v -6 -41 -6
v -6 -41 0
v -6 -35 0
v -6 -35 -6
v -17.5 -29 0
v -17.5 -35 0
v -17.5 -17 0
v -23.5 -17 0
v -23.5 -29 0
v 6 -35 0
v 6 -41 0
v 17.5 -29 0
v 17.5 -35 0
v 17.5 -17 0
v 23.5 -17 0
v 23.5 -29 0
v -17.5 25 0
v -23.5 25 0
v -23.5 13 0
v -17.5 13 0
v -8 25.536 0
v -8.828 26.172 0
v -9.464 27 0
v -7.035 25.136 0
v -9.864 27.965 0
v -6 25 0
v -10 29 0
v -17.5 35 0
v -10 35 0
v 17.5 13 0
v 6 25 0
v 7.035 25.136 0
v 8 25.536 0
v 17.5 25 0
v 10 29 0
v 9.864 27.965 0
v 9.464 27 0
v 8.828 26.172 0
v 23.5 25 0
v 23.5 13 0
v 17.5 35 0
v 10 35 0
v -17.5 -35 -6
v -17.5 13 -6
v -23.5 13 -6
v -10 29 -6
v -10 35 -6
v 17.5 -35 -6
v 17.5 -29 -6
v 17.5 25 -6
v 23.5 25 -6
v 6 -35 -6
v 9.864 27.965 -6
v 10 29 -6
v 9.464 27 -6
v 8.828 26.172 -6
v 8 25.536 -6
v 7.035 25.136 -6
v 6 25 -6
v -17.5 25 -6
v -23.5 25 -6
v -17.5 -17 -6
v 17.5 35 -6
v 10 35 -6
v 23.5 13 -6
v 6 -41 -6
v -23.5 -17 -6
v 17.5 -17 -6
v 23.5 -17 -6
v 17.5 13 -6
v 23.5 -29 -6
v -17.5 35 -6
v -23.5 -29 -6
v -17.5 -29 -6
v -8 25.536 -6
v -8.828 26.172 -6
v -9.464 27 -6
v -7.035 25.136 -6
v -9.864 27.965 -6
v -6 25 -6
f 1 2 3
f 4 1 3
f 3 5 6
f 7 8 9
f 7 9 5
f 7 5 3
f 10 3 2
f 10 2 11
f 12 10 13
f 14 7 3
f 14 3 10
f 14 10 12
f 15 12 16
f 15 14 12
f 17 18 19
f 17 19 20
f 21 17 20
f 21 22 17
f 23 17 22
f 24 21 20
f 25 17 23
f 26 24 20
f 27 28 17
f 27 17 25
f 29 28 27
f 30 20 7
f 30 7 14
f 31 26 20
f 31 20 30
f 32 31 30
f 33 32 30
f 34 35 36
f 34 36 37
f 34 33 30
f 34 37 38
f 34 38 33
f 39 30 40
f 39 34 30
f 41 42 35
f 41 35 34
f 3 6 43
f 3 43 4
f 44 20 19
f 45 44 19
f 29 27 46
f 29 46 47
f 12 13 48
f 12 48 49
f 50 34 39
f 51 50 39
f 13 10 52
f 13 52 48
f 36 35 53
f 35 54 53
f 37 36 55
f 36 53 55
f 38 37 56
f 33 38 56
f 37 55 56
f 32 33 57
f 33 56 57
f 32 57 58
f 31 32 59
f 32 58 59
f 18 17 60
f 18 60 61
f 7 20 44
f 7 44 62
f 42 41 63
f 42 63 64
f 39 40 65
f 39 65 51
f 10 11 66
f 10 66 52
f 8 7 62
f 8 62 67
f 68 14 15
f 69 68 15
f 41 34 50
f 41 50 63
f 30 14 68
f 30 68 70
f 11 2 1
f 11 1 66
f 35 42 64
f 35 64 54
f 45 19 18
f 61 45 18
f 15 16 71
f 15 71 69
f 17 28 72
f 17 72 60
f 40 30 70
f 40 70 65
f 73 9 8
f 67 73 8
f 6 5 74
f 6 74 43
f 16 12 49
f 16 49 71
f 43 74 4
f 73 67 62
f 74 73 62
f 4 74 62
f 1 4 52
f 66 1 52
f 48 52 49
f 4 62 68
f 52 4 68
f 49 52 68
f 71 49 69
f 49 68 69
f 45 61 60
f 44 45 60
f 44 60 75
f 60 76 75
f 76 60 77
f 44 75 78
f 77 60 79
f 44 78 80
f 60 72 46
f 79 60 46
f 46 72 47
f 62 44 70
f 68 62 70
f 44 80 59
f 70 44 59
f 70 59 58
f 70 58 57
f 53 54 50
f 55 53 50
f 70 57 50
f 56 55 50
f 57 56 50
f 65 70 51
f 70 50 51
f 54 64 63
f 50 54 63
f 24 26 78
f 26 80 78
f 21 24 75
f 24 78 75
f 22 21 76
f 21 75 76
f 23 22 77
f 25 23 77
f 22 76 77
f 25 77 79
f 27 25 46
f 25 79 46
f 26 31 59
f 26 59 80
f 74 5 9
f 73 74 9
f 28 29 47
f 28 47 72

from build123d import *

# Parameters (mm, degrees)
SKETCH1_W           = 6
SKETCH1_H           = 6
BOSS_EXTRUDE1_DEPTH = 6
SKETCH1_3_W         = 6
SKETCH1_3_H         = 12
BOSS_EXTRUDE2_DEPTH = 6
FILLET2_R           = 4


with BuildPart() as part:
    # Sketch1 → Boss-Extrude1 (new body)
    with BuildSketch(Plane.XY):
        Polygon((-17.5, 35), (-17.5, -35), (0, 0), align=None)
        Polygon((-10, 35), (-17.5, 35), (0, 0), (17.5, 35), (10, 35), (10, 25), (-10, 25), align=None)
        Polygon((0, 0), (17.5, -35), (17.5, -29), (17.5, -17), (17.5, 13), (17.5, 25), (17.5, 35), align=None)
        Polygon((-6, -35), (0, -35), (6, -35), (17.5, -35), (0, 0), (-17.5, -35), align=None)
        with Locations((3, -38)):
            Rectangle(SKETCH1_W, SKETCH1_H)
        with Locations((-3, -38)):
            Rectangle(SKETCH1_W, SKETCH1_H)
    extrude(amount=-BOSS_EXTRUDE1_DEPTH)

    # Sketch1<3> → Boss-Extrude2 (add)
    with BuildSketch(Plane.XY):
        with Locations((20.5, 19)):
            Rectangle(SKETCH1_3_W, SKETCH1_3_H)
        with Locations((20.5, -23)):
            Rectangle(SKETCH1_3_W, SKETCH1_3_H)
    boss_extrude2 = extrude(amount=-BOSS_EXTRUDE2_DEPTH)

    # Mirror1: Boss-Extrude2 across plane
    add(boss_extrude2.mirror(Plane(origin=(0, 0, 0), x_dir=(0, 0, 1), z_dir=(1, 0, 0))))

    # Fillet2
    fillet2_edges = [part.edges().sort_by_distance(p)[0] for p in [
        (-10, 25, -3),
        (10, 25, -3),
    ]]
    fillet(fillet2_edges, radius=FILLET2_R)


solid = part.part
